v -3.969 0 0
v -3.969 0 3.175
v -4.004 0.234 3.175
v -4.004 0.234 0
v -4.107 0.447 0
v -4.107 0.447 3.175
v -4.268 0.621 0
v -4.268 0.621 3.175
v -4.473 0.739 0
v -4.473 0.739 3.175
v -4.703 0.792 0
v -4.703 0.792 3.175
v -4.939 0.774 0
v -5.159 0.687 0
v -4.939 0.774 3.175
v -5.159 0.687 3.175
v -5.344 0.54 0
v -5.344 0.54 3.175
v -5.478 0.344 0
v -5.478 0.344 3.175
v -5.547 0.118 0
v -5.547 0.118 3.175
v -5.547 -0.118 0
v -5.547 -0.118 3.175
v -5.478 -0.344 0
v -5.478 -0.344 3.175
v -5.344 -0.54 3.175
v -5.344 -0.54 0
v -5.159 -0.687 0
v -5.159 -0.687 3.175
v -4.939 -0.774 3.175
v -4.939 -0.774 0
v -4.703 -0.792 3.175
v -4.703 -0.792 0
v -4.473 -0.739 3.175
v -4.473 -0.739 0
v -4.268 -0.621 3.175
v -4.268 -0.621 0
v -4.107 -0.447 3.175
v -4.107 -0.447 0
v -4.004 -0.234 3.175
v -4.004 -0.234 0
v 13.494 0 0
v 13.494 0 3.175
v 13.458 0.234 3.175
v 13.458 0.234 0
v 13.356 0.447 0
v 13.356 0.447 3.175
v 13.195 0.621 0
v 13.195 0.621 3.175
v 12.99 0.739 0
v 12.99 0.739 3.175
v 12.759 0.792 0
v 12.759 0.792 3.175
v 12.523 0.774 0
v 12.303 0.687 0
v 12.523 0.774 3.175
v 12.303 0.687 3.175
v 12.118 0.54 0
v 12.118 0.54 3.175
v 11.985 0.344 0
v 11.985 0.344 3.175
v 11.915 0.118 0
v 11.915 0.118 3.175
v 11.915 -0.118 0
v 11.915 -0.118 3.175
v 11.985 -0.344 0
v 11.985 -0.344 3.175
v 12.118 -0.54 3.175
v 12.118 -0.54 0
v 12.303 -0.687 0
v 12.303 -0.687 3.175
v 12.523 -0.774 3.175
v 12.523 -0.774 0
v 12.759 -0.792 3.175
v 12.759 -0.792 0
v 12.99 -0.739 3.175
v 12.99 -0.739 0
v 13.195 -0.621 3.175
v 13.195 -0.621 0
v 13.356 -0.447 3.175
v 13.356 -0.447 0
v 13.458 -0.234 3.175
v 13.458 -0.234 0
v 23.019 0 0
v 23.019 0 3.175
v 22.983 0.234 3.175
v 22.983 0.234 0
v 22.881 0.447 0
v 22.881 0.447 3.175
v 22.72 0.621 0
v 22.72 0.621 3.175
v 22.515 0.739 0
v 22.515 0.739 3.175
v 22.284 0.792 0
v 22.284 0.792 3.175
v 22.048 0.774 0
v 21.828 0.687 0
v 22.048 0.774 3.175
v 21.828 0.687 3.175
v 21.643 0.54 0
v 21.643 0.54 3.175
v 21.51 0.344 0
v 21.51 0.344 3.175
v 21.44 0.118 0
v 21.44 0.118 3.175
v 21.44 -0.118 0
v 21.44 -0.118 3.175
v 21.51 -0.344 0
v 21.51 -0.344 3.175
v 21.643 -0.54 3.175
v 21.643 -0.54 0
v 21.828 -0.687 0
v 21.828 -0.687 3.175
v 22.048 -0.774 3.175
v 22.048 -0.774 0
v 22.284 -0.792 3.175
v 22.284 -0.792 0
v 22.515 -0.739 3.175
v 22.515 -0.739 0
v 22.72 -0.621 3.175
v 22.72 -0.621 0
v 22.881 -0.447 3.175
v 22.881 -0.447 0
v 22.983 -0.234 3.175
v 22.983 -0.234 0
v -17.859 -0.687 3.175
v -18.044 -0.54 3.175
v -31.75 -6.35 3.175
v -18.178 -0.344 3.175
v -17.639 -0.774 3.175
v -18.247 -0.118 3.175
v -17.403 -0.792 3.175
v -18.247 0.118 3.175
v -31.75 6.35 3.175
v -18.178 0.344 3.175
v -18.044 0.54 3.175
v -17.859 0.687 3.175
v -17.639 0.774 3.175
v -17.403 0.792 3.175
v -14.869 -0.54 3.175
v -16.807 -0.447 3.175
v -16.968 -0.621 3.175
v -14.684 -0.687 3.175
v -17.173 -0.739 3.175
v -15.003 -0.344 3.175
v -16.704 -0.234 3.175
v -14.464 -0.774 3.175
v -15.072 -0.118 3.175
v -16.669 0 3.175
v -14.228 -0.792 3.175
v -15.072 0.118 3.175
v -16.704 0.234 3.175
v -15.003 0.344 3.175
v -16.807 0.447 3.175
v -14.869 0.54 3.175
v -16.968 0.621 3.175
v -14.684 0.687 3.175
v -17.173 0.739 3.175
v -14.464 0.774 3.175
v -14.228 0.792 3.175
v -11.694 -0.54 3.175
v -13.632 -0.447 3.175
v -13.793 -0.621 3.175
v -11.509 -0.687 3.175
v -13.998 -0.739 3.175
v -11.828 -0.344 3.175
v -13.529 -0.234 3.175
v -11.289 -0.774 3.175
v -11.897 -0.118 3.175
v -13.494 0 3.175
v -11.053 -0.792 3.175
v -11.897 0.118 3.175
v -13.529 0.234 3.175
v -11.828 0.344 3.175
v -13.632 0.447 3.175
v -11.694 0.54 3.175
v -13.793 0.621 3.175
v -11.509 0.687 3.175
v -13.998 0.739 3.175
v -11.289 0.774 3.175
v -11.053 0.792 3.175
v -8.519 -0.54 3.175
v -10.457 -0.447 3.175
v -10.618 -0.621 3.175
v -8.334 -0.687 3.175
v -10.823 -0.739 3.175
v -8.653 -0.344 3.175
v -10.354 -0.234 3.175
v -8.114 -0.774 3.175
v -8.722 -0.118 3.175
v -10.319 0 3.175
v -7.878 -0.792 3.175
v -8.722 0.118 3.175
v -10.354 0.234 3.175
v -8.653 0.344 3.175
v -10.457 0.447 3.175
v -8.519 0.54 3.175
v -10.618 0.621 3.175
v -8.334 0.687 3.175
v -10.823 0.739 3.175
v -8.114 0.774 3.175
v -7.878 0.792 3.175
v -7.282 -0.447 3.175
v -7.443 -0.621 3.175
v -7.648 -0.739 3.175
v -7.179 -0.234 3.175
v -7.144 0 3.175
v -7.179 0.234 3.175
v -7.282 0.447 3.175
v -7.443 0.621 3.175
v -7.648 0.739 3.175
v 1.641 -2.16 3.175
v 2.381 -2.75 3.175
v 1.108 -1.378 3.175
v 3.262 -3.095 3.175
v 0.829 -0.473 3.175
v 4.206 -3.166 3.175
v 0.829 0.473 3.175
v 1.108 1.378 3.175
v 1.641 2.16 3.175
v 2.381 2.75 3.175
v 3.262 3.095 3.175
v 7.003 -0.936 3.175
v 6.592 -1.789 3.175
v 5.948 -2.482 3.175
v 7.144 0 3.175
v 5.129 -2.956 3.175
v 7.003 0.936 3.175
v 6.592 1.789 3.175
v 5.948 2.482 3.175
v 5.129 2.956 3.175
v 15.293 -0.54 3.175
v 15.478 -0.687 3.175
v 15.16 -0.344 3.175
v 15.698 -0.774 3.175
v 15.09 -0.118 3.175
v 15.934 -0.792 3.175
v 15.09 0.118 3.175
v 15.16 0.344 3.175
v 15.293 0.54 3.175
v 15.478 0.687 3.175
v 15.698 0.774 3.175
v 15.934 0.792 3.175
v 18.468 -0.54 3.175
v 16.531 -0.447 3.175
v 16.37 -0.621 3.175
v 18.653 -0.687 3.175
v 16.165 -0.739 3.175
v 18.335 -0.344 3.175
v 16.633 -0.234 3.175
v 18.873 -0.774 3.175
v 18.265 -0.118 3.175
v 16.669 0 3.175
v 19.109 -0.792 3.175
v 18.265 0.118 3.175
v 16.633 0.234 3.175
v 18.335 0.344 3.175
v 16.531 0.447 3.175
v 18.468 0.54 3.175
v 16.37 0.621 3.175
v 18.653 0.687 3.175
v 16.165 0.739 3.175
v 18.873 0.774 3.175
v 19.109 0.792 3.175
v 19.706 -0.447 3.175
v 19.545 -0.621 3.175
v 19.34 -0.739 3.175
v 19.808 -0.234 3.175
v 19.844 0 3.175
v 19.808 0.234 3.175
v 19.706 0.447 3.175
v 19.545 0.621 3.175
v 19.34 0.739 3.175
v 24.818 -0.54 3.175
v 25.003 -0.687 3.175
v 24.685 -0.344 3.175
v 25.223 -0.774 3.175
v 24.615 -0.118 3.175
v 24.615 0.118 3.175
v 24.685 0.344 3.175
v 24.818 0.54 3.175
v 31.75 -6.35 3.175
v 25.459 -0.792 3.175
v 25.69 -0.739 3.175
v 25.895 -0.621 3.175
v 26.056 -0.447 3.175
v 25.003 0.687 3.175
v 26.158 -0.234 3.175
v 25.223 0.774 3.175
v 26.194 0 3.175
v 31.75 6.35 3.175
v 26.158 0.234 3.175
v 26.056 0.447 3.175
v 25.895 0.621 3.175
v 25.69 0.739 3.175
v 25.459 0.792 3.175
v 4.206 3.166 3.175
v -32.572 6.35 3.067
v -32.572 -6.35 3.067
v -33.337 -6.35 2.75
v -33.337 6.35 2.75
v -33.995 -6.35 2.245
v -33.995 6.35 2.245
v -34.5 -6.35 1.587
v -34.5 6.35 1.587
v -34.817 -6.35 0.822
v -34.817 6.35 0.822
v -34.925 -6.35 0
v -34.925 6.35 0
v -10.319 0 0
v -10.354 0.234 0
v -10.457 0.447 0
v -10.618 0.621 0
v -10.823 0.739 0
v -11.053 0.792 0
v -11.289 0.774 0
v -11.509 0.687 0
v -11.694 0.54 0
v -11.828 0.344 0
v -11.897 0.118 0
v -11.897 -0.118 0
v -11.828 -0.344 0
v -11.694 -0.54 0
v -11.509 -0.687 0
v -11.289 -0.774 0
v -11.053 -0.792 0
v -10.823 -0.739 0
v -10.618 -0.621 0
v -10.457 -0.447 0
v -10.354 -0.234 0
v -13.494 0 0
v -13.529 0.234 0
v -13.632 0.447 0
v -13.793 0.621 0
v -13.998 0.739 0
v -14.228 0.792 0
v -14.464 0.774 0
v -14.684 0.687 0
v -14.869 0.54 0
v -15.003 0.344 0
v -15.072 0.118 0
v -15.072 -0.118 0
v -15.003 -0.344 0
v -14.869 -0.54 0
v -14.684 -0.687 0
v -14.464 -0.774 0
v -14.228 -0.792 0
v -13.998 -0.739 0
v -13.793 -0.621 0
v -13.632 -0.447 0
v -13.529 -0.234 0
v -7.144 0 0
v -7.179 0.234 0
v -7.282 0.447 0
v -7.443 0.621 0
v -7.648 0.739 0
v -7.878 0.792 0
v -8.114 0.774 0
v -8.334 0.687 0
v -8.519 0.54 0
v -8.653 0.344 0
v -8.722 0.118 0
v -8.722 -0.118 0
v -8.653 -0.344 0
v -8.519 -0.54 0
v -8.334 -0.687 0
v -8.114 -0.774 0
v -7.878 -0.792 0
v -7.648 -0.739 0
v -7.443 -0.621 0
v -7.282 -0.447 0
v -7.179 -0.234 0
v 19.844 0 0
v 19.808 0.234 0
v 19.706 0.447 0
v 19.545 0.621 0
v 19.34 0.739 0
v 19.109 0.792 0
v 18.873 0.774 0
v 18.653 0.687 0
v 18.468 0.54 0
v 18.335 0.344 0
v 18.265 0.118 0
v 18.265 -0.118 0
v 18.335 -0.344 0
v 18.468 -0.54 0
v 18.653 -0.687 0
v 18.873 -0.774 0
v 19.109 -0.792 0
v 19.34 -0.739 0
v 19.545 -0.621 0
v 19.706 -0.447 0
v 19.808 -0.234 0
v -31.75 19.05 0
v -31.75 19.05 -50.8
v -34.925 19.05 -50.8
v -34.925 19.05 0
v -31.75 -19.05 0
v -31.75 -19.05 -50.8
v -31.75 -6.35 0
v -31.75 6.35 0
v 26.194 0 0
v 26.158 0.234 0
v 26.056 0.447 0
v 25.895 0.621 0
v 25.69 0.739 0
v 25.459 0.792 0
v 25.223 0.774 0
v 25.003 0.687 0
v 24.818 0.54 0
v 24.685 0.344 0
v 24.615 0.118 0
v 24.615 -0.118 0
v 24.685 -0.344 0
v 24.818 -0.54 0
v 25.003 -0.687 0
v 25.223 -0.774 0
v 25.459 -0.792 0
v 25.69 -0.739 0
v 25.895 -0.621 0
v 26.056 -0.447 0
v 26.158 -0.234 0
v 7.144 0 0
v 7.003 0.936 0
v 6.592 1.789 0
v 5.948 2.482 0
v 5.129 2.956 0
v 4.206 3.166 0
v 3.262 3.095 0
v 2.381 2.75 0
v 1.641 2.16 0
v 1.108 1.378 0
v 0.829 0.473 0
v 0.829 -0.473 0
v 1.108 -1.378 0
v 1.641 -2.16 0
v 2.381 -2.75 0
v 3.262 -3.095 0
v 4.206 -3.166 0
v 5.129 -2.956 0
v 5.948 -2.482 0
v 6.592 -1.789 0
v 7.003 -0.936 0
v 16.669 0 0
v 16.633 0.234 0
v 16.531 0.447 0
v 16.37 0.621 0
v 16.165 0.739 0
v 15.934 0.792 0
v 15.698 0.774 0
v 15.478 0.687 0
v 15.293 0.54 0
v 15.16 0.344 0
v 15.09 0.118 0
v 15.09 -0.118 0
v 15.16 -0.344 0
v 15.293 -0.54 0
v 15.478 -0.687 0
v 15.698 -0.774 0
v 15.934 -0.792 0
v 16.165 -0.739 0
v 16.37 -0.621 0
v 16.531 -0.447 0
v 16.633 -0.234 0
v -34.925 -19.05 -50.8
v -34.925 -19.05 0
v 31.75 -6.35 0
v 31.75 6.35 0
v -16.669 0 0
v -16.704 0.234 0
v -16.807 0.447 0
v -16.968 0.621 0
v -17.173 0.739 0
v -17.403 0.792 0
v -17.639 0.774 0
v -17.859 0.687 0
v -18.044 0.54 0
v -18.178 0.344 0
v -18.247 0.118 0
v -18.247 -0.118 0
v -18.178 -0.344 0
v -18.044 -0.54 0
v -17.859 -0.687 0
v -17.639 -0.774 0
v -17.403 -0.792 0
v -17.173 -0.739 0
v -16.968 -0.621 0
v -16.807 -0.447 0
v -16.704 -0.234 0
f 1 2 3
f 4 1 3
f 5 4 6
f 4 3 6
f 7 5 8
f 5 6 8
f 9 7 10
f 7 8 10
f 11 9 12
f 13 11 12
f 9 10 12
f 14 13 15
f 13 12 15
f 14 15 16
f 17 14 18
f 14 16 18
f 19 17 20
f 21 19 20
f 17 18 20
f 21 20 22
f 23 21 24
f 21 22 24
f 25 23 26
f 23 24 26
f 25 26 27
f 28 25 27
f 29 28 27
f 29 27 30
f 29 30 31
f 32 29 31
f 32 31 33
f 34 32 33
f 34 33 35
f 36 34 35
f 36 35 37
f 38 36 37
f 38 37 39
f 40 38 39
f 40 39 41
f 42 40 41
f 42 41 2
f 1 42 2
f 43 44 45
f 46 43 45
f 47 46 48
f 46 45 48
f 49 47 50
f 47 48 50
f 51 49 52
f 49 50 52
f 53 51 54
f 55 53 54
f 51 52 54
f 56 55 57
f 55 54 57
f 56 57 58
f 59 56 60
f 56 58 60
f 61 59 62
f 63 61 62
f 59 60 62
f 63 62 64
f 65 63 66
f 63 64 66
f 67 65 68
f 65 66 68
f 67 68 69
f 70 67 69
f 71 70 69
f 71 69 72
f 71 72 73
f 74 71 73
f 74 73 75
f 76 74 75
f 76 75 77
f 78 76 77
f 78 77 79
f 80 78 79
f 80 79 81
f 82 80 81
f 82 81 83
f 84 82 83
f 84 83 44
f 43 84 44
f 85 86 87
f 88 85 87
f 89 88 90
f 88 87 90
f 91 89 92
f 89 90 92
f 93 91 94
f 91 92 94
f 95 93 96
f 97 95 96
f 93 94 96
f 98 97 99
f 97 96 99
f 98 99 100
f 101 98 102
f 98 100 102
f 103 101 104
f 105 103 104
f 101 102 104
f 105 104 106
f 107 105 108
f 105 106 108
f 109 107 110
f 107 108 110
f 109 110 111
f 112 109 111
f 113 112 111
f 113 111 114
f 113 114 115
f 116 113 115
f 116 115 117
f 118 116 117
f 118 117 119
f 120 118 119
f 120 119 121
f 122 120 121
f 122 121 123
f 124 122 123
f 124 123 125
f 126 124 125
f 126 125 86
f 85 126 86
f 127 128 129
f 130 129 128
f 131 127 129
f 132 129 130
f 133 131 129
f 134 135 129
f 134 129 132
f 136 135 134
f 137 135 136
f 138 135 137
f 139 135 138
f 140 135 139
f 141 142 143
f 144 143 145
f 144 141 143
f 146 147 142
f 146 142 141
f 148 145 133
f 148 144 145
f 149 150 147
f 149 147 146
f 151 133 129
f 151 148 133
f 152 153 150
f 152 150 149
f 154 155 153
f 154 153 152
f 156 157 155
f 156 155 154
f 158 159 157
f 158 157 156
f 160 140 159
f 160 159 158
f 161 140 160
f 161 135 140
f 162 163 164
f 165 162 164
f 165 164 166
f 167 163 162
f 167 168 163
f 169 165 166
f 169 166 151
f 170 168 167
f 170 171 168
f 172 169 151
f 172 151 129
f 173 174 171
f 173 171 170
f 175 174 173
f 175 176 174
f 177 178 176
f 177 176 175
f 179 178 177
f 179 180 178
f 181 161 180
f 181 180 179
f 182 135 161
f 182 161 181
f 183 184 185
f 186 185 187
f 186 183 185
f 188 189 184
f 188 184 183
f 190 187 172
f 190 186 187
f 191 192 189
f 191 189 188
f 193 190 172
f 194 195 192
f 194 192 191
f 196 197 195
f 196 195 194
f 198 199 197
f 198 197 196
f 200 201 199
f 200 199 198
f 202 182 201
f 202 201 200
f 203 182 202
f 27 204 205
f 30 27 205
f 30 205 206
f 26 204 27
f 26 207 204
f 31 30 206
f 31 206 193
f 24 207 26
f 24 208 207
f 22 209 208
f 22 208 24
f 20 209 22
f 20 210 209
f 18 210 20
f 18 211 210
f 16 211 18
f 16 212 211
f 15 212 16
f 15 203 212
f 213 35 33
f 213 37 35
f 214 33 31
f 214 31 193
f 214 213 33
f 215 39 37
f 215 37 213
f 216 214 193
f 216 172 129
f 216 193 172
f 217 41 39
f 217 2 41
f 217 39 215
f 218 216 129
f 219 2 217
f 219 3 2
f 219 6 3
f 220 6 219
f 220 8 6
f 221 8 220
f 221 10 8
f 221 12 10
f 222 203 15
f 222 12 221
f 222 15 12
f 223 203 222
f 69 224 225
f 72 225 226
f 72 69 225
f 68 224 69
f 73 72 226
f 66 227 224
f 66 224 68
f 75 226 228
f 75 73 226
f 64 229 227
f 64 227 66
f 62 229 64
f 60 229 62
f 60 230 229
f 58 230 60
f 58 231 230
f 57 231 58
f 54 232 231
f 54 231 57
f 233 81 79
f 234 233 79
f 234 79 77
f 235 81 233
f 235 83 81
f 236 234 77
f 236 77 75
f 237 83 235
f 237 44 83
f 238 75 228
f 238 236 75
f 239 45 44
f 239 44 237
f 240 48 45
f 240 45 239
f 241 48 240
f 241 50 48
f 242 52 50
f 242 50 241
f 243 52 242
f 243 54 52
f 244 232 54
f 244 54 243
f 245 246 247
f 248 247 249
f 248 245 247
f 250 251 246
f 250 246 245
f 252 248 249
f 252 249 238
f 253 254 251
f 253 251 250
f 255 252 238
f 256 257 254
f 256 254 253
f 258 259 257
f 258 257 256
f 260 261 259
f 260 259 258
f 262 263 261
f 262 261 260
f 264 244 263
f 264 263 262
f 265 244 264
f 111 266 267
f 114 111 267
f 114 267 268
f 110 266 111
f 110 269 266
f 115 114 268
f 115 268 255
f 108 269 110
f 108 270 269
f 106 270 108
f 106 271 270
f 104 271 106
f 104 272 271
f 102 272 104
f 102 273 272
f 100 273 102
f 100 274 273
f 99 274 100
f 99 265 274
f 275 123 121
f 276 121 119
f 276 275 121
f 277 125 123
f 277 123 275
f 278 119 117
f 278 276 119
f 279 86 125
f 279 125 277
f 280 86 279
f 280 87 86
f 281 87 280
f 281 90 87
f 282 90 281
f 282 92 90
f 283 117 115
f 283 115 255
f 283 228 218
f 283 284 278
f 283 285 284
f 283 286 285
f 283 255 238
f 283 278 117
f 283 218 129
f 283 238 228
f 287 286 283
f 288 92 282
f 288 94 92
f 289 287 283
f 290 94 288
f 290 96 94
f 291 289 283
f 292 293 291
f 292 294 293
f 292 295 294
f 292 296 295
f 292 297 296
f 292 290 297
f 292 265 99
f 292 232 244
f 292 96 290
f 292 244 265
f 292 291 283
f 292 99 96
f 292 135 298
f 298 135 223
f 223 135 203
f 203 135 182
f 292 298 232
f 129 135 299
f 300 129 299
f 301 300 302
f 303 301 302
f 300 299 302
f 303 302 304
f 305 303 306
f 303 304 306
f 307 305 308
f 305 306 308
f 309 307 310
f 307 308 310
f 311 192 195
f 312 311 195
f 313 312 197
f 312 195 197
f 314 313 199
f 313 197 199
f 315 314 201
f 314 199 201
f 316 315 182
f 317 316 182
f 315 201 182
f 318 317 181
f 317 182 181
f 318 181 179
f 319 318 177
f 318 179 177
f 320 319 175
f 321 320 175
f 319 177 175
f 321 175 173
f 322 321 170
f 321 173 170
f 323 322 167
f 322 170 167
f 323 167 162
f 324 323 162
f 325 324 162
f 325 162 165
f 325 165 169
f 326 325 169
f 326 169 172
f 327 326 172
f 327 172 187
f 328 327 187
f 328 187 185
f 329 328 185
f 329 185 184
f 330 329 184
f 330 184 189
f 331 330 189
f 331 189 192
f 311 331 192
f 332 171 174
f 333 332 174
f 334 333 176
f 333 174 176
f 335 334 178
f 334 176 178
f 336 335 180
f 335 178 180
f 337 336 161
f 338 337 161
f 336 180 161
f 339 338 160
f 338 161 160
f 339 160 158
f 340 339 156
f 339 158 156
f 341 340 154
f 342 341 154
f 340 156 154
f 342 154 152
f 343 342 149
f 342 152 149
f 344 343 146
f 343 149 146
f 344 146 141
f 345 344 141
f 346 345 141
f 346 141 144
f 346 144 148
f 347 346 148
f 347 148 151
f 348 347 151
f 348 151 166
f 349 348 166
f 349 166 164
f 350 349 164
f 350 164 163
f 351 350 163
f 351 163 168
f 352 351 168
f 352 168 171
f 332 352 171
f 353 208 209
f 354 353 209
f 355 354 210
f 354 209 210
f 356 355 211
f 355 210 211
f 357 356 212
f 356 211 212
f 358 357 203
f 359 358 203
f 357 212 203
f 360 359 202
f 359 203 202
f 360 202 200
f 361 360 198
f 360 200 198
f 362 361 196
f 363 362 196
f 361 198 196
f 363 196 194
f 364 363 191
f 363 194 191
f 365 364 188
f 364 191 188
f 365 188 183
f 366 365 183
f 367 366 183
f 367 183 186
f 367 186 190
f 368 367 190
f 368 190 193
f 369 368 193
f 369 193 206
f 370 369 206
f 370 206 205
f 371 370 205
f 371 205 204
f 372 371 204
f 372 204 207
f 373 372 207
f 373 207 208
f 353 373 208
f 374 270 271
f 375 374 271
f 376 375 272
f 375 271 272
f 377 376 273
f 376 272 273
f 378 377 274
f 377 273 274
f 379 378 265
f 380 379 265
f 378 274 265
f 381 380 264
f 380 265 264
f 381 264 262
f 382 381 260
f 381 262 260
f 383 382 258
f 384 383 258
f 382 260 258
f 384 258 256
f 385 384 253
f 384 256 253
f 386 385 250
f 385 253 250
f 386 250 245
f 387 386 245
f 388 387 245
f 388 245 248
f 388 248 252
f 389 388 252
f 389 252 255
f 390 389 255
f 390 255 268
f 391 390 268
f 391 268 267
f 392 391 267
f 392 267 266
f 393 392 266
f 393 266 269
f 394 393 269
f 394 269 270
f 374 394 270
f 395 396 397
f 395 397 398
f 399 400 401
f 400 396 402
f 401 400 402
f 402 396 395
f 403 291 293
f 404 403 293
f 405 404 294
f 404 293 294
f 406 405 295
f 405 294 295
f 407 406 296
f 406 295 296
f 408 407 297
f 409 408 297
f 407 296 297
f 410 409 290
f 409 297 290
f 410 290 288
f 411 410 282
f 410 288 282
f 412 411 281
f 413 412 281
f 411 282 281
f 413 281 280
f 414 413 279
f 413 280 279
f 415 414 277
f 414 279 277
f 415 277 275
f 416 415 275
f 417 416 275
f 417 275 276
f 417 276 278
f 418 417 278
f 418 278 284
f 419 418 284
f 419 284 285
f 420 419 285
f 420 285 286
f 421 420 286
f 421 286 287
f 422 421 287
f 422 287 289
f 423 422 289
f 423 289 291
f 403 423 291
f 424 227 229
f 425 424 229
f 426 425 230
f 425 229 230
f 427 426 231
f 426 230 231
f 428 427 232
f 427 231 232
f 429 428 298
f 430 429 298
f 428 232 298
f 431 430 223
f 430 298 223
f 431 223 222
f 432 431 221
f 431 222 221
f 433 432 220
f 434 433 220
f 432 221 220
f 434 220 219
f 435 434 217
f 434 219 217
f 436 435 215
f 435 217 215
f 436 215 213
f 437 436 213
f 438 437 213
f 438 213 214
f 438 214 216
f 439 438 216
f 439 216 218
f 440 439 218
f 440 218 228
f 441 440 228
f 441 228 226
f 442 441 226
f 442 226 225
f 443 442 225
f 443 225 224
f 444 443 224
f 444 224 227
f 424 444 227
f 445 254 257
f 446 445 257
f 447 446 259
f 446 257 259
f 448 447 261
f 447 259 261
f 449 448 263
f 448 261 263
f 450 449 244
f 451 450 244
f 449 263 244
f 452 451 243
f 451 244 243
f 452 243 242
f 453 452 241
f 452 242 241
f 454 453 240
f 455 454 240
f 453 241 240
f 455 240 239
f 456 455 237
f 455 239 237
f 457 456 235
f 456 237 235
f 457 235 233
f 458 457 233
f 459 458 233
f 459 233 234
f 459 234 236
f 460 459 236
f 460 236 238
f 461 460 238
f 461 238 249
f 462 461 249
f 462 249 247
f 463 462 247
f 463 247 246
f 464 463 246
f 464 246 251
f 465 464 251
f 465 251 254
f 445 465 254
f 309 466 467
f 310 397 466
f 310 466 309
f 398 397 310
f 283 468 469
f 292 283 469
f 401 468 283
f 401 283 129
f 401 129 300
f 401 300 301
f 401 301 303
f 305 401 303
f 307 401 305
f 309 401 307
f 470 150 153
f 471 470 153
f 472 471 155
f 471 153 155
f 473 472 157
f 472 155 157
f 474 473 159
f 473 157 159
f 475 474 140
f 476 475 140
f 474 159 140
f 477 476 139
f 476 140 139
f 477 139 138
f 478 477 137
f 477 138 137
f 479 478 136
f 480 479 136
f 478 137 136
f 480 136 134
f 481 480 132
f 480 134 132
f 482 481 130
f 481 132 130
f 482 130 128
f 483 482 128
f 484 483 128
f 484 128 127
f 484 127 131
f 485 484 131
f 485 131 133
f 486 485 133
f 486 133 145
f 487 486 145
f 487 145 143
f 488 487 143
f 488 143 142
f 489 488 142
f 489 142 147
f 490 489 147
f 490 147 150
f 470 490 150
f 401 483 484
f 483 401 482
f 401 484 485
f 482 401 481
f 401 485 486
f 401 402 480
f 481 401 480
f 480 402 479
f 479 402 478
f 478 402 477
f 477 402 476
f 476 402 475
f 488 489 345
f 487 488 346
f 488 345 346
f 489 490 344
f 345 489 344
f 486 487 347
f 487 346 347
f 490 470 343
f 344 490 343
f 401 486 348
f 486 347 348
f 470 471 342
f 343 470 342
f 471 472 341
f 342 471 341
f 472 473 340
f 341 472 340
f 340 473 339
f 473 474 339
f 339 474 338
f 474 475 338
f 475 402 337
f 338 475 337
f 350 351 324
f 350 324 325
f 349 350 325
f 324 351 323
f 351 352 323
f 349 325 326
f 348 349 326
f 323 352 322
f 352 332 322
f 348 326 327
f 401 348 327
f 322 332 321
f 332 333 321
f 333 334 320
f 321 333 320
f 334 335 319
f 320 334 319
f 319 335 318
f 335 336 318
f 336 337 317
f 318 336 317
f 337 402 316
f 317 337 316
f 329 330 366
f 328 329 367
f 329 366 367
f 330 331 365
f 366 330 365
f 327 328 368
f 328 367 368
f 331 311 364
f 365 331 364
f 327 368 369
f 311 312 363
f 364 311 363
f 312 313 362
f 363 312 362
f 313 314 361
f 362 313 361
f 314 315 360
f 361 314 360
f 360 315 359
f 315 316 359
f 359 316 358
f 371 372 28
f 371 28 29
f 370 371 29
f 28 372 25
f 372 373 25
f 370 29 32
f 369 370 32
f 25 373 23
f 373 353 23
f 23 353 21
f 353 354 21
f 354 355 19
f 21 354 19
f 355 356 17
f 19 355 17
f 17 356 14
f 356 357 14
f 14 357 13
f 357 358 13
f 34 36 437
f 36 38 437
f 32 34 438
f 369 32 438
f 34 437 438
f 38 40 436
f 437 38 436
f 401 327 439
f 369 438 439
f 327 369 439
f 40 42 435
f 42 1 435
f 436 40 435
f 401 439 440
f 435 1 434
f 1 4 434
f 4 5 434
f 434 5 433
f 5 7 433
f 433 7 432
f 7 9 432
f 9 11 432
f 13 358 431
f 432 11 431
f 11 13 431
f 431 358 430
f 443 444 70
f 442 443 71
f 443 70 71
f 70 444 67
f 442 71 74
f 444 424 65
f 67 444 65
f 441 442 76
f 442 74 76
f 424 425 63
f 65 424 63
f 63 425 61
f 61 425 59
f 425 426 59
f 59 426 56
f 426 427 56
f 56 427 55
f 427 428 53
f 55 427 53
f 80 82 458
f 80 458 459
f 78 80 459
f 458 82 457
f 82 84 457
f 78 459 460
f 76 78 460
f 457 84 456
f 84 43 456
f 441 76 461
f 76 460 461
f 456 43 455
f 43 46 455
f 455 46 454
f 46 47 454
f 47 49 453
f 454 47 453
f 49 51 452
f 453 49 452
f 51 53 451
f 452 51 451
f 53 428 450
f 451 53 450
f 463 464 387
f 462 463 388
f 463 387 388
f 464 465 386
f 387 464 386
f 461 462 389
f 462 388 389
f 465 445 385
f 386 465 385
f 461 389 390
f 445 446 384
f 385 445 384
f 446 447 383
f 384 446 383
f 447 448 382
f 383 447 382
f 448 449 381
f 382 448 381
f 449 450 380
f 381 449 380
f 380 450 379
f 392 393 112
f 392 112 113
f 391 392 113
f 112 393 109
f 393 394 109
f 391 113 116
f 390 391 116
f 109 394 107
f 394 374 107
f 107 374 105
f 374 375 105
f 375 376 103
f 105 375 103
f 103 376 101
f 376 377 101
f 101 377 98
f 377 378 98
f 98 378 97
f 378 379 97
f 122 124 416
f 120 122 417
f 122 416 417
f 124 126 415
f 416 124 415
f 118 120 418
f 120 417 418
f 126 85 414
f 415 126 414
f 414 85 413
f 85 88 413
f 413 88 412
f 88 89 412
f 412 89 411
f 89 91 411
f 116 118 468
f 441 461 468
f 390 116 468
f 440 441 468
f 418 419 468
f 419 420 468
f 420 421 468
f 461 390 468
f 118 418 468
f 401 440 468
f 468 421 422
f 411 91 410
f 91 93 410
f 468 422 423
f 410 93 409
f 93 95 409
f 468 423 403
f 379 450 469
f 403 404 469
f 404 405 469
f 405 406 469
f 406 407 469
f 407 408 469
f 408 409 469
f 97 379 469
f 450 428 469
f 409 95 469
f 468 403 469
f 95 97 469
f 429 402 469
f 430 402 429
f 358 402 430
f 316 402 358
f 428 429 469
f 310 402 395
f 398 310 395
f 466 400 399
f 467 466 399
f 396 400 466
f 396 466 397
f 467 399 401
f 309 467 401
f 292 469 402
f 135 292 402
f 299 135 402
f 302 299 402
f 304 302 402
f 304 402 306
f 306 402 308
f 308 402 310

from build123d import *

# Parameters (mm, degrees)
SKETCH1_W           = 63.5
SKETCH1_H           = 12.7
BOSS_EXTRUDE1_DEPTH = 3.175
SKETCH2_W           = 50.8
SKETCH2_H           = 38.1
BOSS_EXTRUDE2_DEPTH = 3.175
BOSS_EXTRUDE3_DEPTH = 12.7
SKETCH3_R           = 0.79375
CUT_EXTRUDE1_DEPTH  = 6.35
LPATTERN1_COUNT     = 5
LPATTERN1_PITCH     = 3.175
SKETCH5_R           = 0.79375
CUT_EXTRUDE2_DEPTH  = 6.35
LPATTERN2_COUNT     = 5
LPATTERN2_PITCH     = 3.175
SKETCH6_R           = 3.175
CUT_EXTRUDE3_DEPTH  = 54.975


with BuildPart() as part:
    # Sketch1 → Boss-Extrude1 (new body)
    with BuildSketch(Plane.XY):
        Rectangle(SKETCH1_W, SKETCH1_H)
    extrude(amount=BOSS_EXTRUDE1_DEPTH)



with BuildPart() as body_2:
    # Sketch2 → Boss-Extrude2 (new body)
    with BuildSketch(Plane.ZY.offset(31.75)):
        with Locations((-25.4, 0)):
            Rectangle(SKETCH2_W, SKETCH2_H)
    extrude(amount=BOSS_EXTRUDE2_DEPTH)


with BuildPart() as part_1:
    add(part.part)

    add(body_2.part)  # Boss-Extrude3 merges body 2
    # Sketch4 → Boss-Extrude3 (add)
    with BuildSketch(Plane(origin=(0, 6.35, 0), x_dir=(1, 0, 0), z_dir=(0, 1, 0))):
        with BuildLine():
            Line((-34.925, 0), (-31.75, 0))
            Line((-31.75, 0), (-31.75, -3.175))
            ThreePointArc((-31.75, -3.175), (-33.99506403, -2.24506403), (-34.925, 0))
        make_face()
    extrude(amount=-BOSS_EXTRUDE3_DEPTH)

    # Sketch3 → Cut-Extrude1 (cut)
    with BuildSketch(Plane.XY.offset(3.175)):
        with Locations((25.4, 0)):
            Circle(SKETCH3_R)
    cut_extrude1 = extrude(amount=-CUT_EXTRUDE1_DEPTH, mode=Mode.SUBTRACT)

    # LPattern1: Cut-Extrude1 ×5
    with Locations(*[(-i * LPATTERN1_PITCH, 0, 0) for i in range(1, LPATTERN1_COUNT)]):
        add(cut_extrude1, mode=Mode.SUBTRACT)

    # Sketch5 → Cut-Extrude2 (cut)
    with BuildSketch(Plane.XY.offset(3.175)):
        with Locations((-4.7625, 0)):
            Circle(SKETCH5_R)
    cut_extrude2 = extrude(amount=-CUT_EXTRUDE2_DEPTH, mode=Mode.SUBTRACT)

    # LPattern2: Cut-Extrude2 ×5
    with Locations(*[(-i * LPATTERN2_PITCH, 0, 0) for i in range(1, LPATTERN2_COUNT)]):
        add(cut_extrude2, mode=Mode.SUBTRACT)

    # Sketch6 → Cut-Extrude3 (cut, through all)
    with BuildSketch(Plane.XY.offset(3.175)):
        with Locations((3.96875, 0)):
            Circle(SKETCH6_R)
    extrude(amount=-CUT_EXTRUDE3_DEPTH, mode=Mode.SUBTRACT)


solid = part_1.part
